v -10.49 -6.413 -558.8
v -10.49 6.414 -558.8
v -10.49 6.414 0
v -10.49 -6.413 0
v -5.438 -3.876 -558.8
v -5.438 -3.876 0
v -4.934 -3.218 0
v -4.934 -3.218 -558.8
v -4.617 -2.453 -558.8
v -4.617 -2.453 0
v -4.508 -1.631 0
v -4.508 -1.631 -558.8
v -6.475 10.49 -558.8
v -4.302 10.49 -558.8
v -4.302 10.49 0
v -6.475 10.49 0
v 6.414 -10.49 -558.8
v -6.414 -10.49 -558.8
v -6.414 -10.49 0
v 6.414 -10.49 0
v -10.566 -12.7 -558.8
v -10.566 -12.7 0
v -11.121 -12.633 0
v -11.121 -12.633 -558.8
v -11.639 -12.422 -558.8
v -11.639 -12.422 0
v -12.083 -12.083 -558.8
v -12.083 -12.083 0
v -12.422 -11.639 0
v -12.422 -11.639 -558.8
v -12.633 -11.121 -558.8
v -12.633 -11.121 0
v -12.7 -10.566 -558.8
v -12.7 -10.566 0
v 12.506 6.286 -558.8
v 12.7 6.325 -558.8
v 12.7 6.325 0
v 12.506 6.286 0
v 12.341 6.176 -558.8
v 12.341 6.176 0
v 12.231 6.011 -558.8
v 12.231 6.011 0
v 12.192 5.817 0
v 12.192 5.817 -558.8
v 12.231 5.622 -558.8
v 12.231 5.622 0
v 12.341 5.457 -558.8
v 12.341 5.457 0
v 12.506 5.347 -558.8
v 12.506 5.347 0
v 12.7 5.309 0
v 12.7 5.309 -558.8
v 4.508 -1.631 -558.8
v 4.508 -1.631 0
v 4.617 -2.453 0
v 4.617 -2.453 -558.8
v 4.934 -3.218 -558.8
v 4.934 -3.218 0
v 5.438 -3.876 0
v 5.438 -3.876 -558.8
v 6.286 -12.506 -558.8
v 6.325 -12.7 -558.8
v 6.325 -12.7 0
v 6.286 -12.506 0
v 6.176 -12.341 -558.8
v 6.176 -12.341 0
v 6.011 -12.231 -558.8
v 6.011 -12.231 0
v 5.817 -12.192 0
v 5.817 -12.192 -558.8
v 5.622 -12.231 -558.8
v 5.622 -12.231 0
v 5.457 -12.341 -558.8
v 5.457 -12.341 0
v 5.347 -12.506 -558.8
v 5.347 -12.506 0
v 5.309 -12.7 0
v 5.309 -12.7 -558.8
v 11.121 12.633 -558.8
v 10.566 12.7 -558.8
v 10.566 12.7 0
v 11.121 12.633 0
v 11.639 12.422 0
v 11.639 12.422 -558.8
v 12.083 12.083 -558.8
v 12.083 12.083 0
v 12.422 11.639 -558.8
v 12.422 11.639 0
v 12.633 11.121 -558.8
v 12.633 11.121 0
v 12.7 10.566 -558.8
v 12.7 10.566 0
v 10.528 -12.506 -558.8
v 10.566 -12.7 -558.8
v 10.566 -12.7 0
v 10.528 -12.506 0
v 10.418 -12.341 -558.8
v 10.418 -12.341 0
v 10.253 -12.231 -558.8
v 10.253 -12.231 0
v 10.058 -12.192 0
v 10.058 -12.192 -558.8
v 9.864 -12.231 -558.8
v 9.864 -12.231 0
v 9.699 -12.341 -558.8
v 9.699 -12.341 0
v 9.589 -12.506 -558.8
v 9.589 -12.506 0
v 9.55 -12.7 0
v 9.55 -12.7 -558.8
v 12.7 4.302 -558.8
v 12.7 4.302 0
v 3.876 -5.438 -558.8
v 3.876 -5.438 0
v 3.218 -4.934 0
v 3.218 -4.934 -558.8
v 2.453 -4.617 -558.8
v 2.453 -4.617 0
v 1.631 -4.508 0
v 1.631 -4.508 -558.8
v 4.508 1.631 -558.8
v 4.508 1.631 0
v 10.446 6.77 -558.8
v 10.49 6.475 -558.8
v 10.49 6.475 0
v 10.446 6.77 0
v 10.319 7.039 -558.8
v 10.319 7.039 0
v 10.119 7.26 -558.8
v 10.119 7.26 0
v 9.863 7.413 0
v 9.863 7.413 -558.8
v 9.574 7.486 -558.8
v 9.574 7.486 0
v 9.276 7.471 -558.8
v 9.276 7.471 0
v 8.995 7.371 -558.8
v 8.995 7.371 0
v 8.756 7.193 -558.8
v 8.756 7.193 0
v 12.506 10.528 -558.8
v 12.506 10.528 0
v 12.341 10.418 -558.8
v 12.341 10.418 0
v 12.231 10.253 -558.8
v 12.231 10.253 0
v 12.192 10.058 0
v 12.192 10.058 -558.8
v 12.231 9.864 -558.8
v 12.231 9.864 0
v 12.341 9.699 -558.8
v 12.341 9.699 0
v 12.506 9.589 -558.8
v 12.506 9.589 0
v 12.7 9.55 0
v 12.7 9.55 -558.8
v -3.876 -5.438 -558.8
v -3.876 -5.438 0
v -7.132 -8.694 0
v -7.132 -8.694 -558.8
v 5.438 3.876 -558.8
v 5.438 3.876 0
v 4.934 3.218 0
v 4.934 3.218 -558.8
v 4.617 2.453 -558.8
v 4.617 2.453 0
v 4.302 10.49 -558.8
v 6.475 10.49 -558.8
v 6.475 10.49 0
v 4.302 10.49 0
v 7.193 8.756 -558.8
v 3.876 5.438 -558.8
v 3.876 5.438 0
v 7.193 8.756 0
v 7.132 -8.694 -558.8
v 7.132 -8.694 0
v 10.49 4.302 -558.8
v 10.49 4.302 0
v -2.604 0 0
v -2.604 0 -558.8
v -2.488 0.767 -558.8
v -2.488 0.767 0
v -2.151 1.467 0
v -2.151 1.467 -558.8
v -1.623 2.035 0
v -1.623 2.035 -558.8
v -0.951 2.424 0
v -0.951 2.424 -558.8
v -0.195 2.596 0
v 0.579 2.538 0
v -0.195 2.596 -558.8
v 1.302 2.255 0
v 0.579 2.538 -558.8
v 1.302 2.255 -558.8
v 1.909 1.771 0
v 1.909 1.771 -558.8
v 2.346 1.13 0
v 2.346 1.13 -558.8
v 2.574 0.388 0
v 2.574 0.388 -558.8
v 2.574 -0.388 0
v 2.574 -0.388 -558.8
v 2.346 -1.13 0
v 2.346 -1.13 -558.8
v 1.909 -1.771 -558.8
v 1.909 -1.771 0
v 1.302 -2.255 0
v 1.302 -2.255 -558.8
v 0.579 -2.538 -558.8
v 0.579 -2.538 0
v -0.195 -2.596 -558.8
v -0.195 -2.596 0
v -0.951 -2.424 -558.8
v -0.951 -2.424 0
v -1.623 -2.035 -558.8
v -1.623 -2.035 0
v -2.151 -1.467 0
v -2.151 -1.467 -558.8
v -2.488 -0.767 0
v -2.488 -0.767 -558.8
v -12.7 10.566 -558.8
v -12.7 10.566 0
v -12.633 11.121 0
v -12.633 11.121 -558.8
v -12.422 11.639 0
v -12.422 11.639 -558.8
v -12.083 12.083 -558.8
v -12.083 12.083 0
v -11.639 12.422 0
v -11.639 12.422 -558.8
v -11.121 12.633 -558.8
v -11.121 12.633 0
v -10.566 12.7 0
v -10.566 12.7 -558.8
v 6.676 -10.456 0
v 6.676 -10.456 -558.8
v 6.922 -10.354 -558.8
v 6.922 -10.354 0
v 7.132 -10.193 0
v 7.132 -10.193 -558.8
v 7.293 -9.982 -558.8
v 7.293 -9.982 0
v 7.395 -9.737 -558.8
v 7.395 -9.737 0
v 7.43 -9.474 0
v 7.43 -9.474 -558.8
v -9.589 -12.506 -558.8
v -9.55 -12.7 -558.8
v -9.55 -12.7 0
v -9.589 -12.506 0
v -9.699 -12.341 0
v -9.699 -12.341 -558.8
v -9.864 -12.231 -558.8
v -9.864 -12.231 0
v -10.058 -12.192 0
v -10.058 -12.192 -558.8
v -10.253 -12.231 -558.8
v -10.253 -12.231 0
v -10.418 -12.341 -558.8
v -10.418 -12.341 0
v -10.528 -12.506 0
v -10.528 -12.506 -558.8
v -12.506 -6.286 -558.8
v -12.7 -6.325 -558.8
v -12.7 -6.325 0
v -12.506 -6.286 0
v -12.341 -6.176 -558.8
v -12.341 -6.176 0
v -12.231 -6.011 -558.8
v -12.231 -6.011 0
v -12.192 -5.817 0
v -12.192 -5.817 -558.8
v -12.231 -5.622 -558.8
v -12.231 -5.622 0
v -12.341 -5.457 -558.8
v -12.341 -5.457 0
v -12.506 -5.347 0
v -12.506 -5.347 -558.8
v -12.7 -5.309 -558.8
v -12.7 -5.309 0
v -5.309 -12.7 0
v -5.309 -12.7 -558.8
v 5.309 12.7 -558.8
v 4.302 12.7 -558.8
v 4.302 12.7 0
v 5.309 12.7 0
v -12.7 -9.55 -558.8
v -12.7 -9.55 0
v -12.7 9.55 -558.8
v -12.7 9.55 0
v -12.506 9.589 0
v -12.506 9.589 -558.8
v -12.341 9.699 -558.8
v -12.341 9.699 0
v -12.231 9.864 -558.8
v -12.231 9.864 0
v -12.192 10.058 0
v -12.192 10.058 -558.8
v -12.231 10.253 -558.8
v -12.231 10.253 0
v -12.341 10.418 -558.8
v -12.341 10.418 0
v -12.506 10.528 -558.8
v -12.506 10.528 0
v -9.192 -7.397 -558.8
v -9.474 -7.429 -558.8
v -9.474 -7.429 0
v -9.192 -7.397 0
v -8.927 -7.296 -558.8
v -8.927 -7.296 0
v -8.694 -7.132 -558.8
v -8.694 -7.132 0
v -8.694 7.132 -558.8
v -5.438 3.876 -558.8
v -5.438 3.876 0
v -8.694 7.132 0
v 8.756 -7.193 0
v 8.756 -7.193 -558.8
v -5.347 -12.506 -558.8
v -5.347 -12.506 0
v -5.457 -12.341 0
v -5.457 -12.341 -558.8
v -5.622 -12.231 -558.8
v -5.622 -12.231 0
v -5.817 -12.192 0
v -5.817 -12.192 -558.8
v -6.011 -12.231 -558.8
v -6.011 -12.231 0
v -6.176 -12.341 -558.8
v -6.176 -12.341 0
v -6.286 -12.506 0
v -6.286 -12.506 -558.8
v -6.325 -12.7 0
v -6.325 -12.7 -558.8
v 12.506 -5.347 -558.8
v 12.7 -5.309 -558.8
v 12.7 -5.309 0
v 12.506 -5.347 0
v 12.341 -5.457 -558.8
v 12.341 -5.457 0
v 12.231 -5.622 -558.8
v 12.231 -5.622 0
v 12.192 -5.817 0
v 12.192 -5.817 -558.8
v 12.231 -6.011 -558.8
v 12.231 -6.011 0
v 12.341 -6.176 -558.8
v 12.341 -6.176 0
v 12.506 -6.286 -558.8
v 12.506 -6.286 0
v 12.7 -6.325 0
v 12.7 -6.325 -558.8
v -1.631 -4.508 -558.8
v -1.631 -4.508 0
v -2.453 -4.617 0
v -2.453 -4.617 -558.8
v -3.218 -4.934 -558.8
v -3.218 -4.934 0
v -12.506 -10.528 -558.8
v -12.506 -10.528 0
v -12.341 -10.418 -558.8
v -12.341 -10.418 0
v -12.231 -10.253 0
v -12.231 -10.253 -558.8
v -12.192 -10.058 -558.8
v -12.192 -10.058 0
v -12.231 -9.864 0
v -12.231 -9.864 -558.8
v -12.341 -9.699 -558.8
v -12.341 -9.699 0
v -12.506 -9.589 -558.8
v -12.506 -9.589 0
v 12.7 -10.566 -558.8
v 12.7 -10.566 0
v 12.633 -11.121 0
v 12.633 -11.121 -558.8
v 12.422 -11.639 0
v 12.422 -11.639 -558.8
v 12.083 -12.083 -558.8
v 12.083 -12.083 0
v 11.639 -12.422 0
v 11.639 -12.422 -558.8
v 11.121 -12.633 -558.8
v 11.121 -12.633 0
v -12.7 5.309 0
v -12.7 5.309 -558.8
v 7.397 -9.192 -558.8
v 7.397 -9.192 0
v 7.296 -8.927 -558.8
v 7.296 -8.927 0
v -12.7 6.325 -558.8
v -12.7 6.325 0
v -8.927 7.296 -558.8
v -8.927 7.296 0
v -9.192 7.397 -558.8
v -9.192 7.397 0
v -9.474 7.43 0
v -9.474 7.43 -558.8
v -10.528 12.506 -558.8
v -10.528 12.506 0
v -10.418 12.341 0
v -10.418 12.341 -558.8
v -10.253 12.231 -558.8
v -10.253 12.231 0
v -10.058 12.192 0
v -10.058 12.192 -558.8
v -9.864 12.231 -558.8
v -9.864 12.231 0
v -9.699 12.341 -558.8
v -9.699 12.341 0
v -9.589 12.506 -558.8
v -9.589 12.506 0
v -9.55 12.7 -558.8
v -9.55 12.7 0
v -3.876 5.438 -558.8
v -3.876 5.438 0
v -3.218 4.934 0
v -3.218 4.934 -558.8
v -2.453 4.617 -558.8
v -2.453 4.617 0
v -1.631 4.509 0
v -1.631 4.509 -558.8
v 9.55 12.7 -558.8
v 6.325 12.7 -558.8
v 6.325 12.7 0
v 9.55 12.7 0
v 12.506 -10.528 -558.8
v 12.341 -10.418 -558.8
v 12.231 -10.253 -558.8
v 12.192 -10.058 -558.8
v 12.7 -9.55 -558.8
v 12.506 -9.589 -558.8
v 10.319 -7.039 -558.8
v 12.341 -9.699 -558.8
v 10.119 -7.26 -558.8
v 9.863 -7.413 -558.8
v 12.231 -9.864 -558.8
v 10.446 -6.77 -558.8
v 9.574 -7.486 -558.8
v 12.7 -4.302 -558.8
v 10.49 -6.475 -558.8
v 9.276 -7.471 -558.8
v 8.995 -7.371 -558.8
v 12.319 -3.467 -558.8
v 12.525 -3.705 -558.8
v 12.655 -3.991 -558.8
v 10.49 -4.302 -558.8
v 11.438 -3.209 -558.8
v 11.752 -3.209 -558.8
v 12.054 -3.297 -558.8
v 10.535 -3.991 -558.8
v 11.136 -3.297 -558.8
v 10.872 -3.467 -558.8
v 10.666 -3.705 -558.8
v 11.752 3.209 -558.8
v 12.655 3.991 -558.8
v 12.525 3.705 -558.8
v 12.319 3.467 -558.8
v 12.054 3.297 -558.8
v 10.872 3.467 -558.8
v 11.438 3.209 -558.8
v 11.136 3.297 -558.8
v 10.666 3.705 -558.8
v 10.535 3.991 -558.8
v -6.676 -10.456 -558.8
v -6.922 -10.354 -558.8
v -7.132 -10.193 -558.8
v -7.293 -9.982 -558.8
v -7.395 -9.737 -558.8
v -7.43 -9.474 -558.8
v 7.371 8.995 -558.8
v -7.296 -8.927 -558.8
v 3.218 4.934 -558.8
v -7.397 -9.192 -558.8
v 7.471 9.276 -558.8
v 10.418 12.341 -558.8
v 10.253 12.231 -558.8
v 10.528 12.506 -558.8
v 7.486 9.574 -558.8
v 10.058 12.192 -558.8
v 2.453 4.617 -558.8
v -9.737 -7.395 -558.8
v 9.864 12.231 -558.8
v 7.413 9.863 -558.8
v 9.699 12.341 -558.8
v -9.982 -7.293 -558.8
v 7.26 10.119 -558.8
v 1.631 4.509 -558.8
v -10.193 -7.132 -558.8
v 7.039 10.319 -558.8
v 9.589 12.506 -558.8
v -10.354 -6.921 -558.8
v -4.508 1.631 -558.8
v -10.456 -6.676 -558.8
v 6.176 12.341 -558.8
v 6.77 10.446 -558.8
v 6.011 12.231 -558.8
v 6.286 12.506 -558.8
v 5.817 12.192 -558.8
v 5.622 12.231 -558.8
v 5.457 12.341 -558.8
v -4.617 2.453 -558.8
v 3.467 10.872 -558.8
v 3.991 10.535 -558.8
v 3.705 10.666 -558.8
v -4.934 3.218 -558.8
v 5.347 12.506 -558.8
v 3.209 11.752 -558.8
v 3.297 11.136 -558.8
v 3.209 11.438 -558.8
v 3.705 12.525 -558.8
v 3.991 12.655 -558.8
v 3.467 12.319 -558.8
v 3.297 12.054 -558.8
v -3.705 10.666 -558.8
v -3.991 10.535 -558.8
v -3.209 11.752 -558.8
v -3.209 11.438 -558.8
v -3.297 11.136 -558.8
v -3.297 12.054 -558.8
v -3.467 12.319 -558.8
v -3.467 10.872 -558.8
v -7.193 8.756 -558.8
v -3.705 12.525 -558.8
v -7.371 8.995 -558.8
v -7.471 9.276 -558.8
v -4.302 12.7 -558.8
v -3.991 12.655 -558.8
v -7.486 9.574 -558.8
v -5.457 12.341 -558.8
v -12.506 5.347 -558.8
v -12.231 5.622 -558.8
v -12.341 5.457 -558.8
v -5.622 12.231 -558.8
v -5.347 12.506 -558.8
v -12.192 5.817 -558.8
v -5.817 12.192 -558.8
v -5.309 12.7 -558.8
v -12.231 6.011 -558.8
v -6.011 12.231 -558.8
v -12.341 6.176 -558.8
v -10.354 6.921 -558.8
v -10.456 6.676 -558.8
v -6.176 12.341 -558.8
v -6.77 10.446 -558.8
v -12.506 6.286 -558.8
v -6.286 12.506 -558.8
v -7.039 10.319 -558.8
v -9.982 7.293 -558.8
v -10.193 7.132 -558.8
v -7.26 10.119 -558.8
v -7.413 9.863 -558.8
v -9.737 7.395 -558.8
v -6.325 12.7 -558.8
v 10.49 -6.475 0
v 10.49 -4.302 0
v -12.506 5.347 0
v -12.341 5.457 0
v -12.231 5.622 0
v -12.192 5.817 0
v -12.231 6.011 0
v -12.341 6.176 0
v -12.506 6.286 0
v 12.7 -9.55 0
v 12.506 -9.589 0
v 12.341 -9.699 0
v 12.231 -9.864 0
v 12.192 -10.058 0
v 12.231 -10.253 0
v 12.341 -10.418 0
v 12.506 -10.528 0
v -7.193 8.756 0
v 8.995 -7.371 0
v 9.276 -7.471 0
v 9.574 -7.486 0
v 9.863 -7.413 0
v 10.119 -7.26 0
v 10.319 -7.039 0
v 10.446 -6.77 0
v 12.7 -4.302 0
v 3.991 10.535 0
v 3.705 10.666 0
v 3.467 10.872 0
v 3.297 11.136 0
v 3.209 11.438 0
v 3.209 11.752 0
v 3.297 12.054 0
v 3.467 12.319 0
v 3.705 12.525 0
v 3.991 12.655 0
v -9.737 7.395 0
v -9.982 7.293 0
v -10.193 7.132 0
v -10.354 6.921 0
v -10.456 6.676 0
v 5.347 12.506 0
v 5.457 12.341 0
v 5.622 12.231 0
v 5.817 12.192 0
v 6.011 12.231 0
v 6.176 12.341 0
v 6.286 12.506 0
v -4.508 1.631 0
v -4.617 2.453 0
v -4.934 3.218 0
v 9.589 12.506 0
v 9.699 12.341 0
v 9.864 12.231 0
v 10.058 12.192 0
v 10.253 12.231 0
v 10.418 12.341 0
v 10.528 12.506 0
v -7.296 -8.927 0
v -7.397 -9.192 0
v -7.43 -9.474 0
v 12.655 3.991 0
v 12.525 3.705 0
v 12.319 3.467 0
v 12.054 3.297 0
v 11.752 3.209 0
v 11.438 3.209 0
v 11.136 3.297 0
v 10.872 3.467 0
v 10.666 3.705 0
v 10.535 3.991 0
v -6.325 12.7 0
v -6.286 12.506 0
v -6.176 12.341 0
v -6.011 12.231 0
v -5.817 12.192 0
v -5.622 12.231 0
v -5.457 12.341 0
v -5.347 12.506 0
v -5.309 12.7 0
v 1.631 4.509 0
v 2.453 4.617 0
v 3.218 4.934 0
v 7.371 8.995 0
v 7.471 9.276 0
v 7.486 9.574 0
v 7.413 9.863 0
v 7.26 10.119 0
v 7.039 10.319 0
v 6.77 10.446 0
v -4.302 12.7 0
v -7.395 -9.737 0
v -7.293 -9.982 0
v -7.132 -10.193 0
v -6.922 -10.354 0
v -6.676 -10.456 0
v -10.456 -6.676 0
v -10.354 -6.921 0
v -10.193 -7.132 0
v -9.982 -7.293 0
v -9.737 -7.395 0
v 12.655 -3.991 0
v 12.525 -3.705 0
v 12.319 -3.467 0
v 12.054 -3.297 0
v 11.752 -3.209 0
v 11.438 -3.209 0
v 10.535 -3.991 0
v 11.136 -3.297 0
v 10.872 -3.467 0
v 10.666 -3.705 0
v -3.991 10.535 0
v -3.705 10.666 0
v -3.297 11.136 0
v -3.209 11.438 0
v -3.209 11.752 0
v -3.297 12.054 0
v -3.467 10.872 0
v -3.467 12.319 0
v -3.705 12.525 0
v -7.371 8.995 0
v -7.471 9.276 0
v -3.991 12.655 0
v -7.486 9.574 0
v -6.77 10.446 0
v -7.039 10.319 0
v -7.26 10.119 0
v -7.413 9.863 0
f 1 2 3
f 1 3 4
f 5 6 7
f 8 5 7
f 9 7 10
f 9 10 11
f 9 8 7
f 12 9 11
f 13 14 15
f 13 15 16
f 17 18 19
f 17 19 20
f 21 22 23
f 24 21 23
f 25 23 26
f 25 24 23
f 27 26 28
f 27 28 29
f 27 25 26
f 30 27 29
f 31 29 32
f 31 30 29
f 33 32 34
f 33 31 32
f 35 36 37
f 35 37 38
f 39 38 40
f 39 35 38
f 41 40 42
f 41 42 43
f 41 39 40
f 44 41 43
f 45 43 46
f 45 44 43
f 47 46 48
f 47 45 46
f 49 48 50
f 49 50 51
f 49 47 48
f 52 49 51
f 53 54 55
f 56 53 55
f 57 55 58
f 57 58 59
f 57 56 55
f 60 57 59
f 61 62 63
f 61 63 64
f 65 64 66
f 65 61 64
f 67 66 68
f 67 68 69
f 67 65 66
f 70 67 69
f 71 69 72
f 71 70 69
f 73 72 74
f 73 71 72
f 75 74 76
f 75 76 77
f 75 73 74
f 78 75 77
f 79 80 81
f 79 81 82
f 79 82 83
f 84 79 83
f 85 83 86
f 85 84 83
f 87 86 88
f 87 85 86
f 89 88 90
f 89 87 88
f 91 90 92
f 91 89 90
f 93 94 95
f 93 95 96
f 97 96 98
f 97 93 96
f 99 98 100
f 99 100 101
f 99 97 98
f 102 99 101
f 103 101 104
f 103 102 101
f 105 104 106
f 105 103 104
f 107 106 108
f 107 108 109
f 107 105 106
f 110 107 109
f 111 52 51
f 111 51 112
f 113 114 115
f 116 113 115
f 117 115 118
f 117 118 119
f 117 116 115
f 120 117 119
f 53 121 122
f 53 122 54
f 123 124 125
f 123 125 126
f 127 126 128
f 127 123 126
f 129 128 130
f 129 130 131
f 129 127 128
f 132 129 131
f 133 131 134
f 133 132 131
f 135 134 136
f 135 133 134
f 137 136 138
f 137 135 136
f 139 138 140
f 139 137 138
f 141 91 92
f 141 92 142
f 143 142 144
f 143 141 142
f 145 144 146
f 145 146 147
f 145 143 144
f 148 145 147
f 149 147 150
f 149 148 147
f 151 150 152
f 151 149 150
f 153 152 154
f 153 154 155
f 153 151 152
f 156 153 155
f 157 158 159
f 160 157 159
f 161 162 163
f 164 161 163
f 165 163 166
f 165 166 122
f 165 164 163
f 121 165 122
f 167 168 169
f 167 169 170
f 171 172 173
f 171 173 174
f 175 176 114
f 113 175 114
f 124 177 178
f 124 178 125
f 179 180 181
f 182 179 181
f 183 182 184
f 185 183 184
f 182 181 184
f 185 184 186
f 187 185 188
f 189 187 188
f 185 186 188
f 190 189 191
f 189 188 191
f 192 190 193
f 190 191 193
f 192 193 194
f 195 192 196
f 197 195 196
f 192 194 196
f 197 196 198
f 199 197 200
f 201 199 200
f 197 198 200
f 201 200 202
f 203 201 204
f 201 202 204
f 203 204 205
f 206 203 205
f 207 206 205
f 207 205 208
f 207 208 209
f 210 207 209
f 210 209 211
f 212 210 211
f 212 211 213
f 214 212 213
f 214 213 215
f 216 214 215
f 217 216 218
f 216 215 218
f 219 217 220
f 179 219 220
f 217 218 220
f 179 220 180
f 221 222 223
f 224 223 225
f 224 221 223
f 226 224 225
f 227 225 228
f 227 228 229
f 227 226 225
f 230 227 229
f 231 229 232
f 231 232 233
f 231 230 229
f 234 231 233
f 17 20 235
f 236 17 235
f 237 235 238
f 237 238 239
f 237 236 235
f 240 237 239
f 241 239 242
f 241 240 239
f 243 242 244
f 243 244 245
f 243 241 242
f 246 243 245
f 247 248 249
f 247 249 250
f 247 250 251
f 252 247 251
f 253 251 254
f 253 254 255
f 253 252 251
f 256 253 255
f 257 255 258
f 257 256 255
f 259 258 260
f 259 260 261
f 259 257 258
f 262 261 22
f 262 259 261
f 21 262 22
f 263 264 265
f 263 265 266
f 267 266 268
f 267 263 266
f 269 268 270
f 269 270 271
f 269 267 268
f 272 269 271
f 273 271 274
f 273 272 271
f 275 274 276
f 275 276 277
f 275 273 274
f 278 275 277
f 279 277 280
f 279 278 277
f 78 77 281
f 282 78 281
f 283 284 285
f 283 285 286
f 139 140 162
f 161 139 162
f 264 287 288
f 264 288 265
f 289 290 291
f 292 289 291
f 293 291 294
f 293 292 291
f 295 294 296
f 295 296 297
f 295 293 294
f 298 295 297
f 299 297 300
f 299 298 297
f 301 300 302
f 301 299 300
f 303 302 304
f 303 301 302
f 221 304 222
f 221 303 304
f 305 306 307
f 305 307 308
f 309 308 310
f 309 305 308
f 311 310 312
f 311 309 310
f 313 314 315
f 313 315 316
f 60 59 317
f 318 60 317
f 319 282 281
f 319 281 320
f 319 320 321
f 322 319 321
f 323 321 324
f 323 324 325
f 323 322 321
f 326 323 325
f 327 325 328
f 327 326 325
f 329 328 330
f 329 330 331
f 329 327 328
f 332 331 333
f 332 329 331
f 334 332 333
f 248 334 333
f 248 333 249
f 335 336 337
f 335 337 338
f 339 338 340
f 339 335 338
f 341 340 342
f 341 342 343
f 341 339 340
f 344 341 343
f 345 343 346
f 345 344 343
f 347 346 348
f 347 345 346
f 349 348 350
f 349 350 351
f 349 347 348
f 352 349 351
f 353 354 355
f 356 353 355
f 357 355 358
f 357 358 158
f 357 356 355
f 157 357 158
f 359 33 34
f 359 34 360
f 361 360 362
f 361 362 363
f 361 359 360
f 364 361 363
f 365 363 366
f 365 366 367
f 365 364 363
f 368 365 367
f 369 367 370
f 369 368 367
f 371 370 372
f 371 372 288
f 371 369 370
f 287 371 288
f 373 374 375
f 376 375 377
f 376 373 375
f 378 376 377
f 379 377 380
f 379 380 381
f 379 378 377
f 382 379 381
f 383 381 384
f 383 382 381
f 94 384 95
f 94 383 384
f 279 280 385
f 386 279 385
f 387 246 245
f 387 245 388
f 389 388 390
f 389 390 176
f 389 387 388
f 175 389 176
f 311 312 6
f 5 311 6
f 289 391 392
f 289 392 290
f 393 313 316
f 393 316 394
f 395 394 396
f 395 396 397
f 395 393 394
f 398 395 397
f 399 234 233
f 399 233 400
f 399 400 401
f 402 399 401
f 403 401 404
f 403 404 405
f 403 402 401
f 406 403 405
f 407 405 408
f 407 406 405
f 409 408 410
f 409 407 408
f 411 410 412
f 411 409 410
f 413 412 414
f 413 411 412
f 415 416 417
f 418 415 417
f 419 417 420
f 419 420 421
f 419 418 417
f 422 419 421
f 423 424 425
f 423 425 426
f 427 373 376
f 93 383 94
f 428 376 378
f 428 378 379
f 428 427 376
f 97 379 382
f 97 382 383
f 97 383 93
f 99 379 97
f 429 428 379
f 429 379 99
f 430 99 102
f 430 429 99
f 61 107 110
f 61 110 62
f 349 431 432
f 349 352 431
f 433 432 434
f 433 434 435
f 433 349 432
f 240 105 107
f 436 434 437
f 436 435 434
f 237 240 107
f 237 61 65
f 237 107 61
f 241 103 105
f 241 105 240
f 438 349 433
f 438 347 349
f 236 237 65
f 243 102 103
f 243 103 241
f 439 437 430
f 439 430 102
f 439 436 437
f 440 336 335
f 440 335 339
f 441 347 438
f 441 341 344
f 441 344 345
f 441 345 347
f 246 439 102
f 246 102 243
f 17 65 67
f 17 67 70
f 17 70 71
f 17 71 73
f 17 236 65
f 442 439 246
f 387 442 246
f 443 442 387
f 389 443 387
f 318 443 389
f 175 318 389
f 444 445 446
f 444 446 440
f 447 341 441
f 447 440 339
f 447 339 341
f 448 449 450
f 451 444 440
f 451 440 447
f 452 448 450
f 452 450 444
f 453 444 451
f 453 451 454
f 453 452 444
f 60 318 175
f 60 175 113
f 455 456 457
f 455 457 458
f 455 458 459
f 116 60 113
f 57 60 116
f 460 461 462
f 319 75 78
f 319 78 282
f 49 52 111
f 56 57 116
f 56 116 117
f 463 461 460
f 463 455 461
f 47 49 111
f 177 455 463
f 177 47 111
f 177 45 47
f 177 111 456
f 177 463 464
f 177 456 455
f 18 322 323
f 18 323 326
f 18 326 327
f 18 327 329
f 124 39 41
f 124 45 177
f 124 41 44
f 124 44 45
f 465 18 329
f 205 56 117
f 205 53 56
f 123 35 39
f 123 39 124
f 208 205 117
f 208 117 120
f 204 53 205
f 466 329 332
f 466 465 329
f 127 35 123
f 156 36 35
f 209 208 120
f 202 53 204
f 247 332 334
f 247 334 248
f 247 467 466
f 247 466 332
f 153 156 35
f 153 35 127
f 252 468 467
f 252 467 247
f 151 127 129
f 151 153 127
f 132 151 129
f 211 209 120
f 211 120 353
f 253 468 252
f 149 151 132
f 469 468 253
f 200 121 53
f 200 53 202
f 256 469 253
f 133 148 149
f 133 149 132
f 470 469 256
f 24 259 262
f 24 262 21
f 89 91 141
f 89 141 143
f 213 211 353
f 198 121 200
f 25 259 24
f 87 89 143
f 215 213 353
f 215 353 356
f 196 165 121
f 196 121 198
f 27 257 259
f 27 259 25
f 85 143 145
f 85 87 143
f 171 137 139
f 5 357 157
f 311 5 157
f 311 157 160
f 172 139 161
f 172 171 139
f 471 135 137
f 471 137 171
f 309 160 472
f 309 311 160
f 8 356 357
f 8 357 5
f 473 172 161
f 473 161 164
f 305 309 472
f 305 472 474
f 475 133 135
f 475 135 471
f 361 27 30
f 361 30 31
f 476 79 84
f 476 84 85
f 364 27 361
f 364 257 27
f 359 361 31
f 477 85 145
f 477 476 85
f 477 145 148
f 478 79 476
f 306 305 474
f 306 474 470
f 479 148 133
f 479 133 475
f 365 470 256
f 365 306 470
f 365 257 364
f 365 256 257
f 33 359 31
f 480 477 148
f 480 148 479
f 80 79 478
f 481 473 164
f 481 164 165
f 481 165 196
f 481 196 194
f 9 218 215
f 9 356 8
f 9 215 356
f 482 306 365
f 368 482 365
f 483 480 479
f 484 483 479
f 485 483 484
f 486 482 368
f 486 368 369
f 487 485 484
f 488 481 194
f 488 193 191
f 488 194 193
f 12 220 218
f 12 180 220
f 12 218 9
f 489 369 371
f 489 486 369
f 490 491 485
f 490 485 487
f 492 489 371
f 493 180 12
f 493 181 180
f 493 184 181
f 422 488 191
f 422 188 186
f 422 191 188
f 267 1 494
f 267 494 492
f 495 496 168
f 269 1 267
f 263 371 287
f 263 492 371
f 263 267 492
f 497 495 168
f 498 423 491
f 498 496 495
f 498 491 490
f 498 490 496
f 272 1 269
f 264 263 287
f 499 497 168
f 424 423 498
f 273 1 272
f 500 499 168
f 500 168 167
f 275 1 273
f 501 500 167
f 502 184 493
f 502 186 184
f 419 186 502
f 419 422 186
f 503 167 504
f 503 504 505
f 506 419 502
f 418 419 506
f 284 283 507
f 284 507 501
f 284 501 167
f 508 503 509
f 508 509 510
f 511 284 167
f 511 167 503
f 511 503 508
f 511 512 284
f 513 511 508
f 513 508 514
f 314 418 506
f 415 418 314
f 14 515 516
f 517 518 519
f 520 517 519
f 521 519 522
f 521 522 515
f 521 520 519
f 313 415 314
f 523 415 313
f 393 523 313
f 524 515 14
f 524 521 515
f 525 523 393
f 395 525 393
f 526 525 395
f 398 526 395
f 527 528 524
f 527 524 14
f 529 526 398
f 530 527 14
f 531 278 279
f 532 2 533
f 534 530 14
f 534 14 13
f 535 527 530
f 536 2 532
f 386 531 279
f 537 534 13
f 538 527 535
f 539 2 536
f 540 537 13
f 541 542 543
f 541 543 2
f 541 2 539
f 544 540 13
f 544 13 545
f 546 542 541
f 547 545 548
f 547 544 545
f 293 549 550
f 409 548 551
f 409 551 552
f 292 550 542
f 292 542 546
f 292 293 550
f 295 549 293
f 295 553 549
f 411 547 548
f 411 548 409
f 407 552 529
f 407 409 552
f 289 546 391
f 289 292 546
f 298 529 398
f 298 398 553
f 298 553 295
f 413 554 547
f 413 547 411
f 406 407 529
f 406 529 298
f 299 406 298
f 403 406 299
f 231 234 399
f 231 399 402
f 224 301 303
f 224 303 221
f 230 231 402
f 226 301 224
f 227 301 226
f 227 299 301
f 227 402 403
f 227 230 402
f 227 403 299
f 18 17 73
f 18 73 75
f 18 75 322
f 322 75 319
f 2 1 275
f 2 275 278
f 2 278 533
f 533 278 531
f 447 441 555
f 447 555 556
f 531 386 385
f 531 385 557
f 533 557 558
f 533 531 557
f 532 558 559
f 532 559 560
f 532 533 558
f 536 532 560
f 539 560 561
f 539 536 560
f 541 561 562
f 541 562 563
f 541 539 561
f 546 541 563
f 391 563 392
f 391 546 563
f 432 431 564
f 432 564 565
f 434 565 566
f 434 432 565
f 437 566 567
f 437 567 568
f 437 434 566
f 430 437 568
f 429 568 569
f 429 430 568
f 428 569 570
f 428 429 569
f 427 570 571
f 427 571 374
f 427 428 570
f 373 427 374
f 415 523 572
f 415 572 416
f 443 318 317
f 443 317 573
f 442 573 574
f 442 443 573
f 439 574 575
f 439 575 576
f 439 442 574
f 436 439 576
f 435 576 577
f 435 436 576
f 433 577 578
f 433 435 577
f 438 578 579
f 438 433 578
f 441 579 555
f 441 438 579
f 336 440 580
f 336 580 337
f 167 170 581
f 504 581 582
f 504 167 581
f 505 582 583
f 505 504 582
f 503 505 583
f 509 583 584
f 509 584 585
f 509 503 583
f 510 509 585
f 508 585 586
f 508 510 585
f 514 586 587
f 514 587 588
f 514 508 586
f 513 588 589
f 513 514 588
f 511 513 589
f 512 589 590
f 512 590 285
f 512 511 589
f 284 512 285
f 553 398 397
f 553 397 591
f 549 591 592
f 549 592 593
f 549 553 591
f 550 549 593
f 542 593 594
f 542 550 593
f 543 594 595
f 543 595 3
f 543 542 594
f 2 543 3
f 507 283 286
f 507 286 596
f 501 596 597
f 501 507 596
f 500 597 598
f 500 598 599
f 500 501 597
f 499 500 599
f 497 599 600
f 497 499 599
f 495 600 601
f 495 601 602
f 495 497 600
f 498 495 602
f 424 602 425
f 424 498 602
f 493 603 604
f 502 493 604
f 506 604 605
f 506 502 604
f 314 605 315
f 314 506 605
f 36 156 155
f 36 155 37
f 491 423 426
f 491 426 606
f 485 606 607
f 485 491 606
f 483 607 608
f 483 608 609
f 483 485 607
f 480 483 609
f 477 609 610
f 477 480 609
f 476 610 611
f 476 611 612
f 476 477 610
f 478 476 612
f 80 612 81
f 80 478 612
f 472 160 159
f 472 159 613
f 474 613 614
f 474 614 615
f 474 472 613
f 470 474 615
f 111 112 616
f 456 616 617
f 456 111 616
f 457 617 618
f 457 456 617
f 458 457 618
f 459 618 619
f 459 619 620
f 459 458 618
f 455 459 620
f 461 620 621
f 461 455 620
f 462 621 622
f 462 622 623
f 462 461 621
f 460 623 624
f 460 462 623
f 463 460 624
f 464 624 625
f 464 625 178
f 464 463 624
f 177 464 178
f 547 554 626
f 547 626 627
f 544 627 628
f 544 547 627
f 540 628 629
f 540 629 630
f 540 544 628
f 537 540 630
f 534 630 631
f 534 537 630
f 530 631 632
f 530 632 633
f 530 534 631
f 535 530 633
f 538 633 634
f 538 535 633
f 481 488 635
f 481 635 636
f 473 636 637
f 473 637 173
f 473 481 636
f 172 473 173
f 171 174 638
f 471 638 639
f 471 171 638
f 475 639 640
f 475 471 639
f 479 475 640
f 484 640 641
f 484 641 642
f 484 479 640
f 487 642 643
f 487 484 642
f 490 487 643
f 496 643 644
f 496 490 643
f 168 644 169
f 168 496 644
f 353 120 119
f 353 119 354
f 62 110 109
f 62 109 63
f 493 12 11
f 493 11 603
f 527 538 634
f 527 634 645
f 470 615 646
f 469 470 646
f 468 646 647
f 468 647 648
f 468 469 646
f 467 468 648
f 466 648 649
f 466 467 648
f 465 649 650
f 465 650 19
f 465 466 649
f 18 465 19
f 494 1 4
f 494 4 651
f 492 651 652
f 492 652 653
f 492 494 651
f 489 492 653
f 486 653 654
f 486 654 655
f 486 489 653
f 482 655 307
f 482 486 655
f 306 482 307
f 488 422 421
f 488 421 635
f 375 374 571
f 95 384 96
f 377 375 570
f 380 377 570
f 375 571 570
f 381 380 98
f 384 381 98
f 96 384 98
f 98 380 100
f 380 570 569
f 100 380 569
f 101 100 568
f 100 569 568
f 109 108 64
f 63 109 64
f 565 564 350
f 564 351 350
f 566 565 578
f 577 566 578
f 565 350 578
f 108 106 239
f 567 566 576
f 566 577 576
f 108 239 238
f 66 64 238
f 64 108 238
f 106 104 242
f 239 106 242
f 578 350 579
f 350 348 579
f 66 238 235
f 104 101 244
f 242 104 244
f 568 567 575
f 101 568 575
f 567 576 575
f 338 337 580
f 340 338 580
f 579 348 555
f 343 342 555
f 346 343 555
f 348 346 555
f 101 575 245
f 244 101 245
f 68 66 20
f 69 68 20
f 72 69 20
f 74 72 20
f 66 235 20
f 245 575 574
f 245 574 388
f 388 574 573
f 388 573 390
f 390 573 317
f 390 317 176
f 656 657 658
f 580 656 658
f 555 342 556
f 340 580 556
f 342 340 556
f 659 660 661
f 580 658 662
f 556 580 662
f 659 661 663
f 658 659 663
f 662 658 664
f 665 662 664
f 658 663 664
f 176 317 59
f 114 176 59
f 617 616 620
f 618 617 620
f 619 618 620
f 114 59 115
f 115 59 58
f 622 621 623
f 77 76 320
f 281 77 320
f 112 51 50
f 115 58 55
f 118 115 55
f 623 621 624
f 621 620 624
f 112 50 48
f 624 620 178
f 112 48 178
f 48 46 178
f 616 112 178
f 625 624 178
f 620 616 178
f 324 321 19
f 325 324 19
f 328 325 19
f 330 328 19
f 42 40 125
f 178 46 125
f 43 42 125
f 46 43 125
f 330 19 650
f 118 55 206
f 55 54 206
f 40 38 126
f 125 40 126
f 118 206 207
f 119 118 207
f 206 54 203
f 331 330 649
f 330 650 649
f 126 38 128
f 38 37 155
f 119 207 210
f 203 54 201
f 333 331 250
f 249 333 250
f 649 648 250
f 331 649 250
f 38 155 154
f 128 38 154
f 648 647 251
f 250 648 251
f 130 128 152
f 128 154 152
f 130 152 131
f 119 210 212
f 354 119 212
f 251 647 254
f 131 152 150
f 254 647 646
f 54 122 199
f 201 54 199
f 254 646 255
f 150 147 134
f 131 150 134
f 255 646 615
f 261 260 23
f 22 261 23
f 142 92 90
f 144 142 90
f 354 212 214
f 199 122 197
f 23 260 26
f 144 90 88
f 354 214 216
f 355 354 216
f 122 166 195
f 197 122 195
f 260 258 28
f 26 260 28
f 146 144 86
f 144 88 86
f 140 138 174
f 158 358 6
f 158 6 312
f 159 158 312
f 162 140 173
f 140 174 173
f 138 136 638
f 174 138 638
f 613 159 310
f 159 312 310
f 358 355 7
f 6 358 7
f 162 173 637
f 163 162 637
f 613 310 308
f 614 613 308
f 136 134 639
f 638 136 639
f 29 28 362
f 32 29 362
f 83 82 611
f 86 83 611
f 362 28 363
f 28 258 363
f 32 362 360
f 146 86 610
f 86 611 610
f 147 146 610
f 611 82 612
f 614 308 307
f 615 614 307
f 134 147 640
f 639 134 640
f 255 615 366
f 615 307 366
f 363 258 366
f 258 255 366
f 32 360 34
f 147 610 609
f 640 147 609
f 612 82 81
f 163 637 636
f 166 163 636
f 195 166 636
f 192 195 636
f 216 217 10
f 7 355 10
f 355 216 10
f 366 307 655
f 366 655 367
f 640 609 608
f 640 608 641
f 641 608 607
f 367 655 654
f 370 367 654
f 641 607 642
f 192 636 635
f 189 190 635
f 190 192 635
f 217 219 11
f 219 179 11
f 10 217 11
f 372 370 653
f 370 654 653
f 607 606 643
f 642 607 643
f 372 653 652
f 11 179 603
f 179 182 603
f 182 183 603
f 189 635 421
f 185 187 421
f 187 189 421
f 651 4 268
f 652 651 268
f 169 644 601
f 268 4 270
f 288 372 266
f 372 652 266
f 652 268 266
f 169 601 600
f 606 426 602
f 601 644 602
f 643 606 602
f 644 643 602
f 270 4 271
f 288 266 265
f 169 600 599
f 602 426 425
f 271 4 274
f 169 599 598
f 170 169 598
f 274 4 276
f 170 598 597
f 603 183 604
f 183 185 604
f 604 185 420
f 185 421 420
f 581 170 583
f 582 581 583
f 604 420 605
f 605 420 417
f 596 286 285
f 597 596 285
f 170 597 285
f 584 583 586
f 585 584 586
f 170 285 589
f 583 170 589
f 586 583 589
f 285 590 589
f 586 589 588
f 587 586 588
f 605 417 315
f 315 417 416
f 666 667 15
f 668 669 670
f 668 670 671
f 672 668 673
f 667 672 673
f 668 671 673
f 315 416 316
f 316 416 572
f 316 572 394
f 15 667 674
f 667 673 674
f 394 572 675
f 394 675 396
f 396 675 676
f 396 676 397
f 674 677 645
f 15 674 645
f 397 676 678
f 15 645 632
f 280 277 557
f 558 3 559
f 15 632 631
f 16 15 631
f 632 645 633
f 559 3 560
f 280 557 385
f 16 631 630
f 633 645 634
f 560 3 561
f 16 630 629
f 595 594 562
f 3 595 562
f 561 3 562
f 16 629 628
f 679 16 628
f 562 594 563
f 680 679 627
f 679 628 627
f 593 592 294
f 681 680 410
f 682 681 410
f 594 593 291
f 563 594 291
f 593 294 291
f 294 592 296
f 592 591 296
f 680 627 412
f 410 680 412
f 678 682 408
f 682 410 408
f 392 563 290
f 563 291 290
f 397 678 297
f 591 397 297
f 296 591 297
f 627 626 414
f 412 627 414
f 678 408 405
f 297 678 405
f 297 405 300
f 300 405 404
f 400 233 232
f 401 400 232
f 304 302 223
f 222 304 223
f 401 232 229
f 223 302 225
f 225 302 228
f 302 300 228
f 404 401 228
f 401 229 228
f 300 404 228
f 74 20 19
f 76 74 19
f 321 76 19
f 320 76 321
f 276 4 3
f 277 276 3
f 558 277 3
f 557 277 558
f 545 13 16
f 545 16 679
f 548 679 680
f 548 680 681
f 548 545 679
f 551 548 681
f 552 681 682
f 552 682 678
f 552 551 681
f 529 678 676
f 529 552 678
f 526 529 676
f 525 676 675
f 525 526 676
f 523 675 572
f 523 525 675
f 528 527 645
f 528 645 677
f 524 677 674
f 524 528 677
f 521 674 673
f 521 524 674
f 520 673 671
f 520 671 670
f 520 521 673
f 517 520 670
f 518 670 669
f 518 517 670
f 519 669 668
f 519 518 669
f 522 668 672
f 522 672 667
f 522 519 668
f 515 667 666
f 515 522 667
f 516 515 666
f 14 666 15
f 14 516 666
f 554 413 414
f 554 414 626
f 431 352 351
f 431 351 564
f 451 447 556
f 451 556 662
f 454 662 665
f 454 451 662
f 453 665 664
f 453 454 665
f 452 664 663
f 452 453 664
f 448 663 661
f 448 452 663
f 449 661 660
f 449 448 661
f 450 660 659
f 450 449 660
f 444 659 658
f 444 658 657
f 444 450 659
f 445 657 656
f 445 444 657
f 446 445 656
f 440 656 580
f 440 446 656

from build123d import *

# Parameters (mm, degrees)
SKETCH1_R           = 2.6035
BOSS_EXTRUDE1_DEPTH = 558.8


with BuildPart() as part:
    # Sketch1 → Boss-Extrude1 (new body)
    with BuildSketch(Plane(origin=(0, 0, -558.8), x_dir=(-1, 0, 0), z_dir=(0, 0, -1))):
        with BuildLine():
            Line((12.699999967, -9.5504), (12.699999967, -6.3246))
            ThreePointArc((12.699999967, -6.3246), (12.191999967, -5.8166), (12.699999967, -5.3086))
            Line((12.699999967, -5.3086), (12.699999967, 5.3086))
            ThreePointArc((12.699999967, 5.3086), (12.191999967, 5.8166), (12.699999967, 6.3246))
            Line((12.699999967, 6.3246), (12.699999967, 9.550399967))
            ThreePointArc((12.699999967, 9.550399967), (12.191999934, 10.058400016), (12.699999999, 10.566400033))
            ThreePointArc((12.699999999, 10.566400033), (12.082677404, 12.082677438), (10.566399999, 12.700000033))
            ThreePointArc((10.566399999, 12.700000033), (10.058400007, 12.192000016), (9.550399999, 12.700000016))
            Line((9.550399999, 12.700000016), (6.324599999, 12.700000016))
            ThreePointArc((6.324599999, 12.700000016), (5.816599999, 12.192000016), (5.308599999, 12.700000016))
            Line((5.308599999, 12.700000016), (4.302307888, 12.700000016))
            ThreePointArc((4.302307888, 12.700000016), (3.197407888, 11.595100016), (4.302307888, 10.490200016))
            Line((4.302307888, 10.490200016), (6.474794464, 10.490200016))
            ThreePointArc((6.474794464, 10.490200016), (7.413456072, 9.863006381), (7.193214956, 8.755779521))
            Line((7.193214956, 8.755779521), (3.875871421, 5.438435986))
            ThreePointArc((3.875871421, 5.438435986), (2.845827288, 4.7501825), (1.63080739, 4.508500016))
            Line((1.63080739, 4.508500016), (-1.630807376, 4.508500016))
            ThreePointArc((-1.630807376, 4.508500016), (-2.845827273, 4.7501825), (-3.875871406, 5.438435986))
            Line((-3.875871406, 5.438435986), (-7.193214947, 8.755779526))
            ThreePointArc((-7.193214947, 8.755779526), (-7.413456062, 9.863006383), (-6.474794457, 10.490200016))
            Line((-6.474794457, 10.490200016), (-4.302307919, 10.490200016))
            ThreePointArc((-4.302307919, 10.490200016), (-3.197407919, 11.595100016), (-4.302307919, 12.700000016))
            Line((-4.302307919, 12.700000016), (-5.308600001, 12.700000016))
            ThreePointArc((-5.308600001, 12.700000016), (-5.816600001, 12.192000016), (-6.324600001, 12.700000016))
            Line((-6.324600001, 12.700000016), (-9.550400001, 12.700000016))
            ThreePointArc((-9.550400001, 12.700000016), (-10.058400001, 12.192000016), (-10.566400001, 12.700000016))
            ThreePointArc((-10.566400001, 12.700000016), (-12.082677418, 12.082677417), (-12.700000017, 10.5664))
            ThreePointArc((-12.700000017, 10.5664), (-12.192, 10.058400008), (-12.7, 9.5504))
            Line((-12.7, 9.5504), (-12.7, 6.3246))
            ThreePointArc((-12.7, 6.3246), (-12.192, 5.8166), (-12.7, 5.3086))
            Line((-12.7, 5.3086), (-12.7, 4.302307889))
            ThreePointArc((-12.7, 4.302307889), (-11.5951, 3.197407889), (-10.4902, 4.302307889))
            Line((-10.4902, 4.302307889), (-10.4902, 6.474794456))
            ThreePointArc((-10.4902, 6.474794456), (-9.863006367, 7.413456061), (-8.75577951, 7.193214945))
            Line((-8.75577951, 7.193214945), (-5.43843597, 3.875871405))
            ThreePointArc((-5.43843597, 3.875871405), (-4.750182484, 2.845827272), (-4.5085, 1.630807374))
            Line((-4.5085, 1.630807374), (-4.5085, -1.630807374))
            ThreePointArc((-4.5085, -1.630807374), (-4.750182484, -2.845827272), (-5.43843597, -3.875871405))
            Line((-5.43843597, -3.875871405), (-8.75577951, -7.193214945))
            ThreePointArc((-8.75577951, -7.193214945), (-9.863006367, -7.413456061), (-10.4902, -6.474794456))
            Line((-10.4902, -6.474794456), (-10.4902, -4.302307918))
            ThreePointArc((-10.4902, -4.302307918), (-11.5951, -3.197407918), (-12.7, -4.302307918))
            Line((-12.7, -4.302307918), (-12.7, -5.3086))
            ThreePointArc((-12.7, -5.3086), (-12.192, -5.8166), (-12.7, -6.3246))
            Line((-12.7, -6.3246), (-12.7, -9.5504))
            ThreePointArc((-12.7, -9.5504), (-12.192, -10.058400008), (-12.700000017, -10.5664))
            ThreePointArc((-12.700000017, -10.5664), (-12.082677422, -12.082677406), (-10.566400017, -12.7))
            ThreePointArc((-10.566400017, -12.7), (-10.058400017, -12.192), (-9.550400017, -12.7))
            Line((-9.550400017, -12.7), (-6.324600017, -12.7))
            ThreePointArc((-6.324600017, -12.7), (-5.816600017, -12.192), (-5.308600017, -12.7))
            Line((-5.308600017, -12.7), (5.308599983, -12.7))
            ThreePointArc((5.308599983, -12.7), (5.816599983, -12.192), (6.324599983, -12.7))
            Line((6.324599983, -12.7), (9.550399983, -12.7))
            ThreePointArc((9.550399983, -12.7), (10.058399983, -12.192), (10.566399983, -12.7))
            ThreePointArc((10.566399983, -12.7), (12.082677389, -12.082677406), (12.699999983, -10.5664))
            ThreePointArc((12.699999983, -10.5664), (12.191999967, -10.058400008), (12.699999967, -9.5504))
        make_face()
        Circle(SKETCH1_R, mode=Mode.SUBTRACT)
        with BuildLine():
            Line((3.875871405, -5.43843597), (7.13192049, -8.694485055))
            ThreePointArc((7.13192049, -8.694485055), (7.35441848, -9.056211656), (7.4295, -9.4742))
            ThreePointArc((7.4295, -9.4742), (7.13192049, -10.19262049), (6.4135, -10.4902))
            Line((6.4135, -10.4902), (-6.4135, -10.4902))
            ThreePointArc((-6.4135, -10.4902), (-7.13192049, -10.19262049), (-7.4295, -9.4742))
            ThreePointArc((-7.4295, -9.4742), (-7.35441848, -9.056211656), (-7.13192049, -8.694485055))
            Line((-7.13192049, -8.694485055), (-3.875871405, -5.43843597))
            ThreePointArc((-3.875871405, -5.43843597), (-2.845827272, -4.750182484), (-1.630807374, -4.5085))
            Line((-1.630807374, -4.5085), (1.630807374, -4.5085))
            ThreePointArc((1.630807374, -4.5085), (2.845827272, -4.750182484), (3.875871405, -5.43843597))
        make_face(mode=Mode.SUBTRACT)
        with BuildLine():
            Line((10.490199999, 6.4135), (10.490199999, -6.413499984))
            ThreePointArc((10.490199999, -6.413499984), (10.192620488, -7.131920474), (9.474199999, -7.429499984))
            ThreePointArc((9.474199999, -7.429499984), (9.056211655, -7.354418464), (8.694485053, -7.131920474))
            Line((8.694485053, -7.131920474), (5.438435968, -3.875871389))
            ThreePointArc((5.438435968, -3.875871389), (4.750182483, -2.845827256), (4.508499999, -1.630807359))
            Line((4.508499999, -1.630807359), (4.508499999, 1.630807373))
            ThreePointArc((4.508499999, 1.630807373), (4.750182483, 2.845827271), (5.438435968, 3.875871403))
            Line((5.438435968, 3.875871403), (8.694485055, 7.13192049))
            ThreePointArc((8.694485055, 7.13192049), (9.056211656, 7.35441848), (9.4742, 7.4295))
            ThreePointArc((9.4742, 7.4295), (10.192620489, 7.131920489), (10.490199999, 6.4135))
        make_face(mode=Mode.SUBTRACT)
    extrude(amount=-BOSS_EXTRUDE1_DEPTH)


solid = part.part
